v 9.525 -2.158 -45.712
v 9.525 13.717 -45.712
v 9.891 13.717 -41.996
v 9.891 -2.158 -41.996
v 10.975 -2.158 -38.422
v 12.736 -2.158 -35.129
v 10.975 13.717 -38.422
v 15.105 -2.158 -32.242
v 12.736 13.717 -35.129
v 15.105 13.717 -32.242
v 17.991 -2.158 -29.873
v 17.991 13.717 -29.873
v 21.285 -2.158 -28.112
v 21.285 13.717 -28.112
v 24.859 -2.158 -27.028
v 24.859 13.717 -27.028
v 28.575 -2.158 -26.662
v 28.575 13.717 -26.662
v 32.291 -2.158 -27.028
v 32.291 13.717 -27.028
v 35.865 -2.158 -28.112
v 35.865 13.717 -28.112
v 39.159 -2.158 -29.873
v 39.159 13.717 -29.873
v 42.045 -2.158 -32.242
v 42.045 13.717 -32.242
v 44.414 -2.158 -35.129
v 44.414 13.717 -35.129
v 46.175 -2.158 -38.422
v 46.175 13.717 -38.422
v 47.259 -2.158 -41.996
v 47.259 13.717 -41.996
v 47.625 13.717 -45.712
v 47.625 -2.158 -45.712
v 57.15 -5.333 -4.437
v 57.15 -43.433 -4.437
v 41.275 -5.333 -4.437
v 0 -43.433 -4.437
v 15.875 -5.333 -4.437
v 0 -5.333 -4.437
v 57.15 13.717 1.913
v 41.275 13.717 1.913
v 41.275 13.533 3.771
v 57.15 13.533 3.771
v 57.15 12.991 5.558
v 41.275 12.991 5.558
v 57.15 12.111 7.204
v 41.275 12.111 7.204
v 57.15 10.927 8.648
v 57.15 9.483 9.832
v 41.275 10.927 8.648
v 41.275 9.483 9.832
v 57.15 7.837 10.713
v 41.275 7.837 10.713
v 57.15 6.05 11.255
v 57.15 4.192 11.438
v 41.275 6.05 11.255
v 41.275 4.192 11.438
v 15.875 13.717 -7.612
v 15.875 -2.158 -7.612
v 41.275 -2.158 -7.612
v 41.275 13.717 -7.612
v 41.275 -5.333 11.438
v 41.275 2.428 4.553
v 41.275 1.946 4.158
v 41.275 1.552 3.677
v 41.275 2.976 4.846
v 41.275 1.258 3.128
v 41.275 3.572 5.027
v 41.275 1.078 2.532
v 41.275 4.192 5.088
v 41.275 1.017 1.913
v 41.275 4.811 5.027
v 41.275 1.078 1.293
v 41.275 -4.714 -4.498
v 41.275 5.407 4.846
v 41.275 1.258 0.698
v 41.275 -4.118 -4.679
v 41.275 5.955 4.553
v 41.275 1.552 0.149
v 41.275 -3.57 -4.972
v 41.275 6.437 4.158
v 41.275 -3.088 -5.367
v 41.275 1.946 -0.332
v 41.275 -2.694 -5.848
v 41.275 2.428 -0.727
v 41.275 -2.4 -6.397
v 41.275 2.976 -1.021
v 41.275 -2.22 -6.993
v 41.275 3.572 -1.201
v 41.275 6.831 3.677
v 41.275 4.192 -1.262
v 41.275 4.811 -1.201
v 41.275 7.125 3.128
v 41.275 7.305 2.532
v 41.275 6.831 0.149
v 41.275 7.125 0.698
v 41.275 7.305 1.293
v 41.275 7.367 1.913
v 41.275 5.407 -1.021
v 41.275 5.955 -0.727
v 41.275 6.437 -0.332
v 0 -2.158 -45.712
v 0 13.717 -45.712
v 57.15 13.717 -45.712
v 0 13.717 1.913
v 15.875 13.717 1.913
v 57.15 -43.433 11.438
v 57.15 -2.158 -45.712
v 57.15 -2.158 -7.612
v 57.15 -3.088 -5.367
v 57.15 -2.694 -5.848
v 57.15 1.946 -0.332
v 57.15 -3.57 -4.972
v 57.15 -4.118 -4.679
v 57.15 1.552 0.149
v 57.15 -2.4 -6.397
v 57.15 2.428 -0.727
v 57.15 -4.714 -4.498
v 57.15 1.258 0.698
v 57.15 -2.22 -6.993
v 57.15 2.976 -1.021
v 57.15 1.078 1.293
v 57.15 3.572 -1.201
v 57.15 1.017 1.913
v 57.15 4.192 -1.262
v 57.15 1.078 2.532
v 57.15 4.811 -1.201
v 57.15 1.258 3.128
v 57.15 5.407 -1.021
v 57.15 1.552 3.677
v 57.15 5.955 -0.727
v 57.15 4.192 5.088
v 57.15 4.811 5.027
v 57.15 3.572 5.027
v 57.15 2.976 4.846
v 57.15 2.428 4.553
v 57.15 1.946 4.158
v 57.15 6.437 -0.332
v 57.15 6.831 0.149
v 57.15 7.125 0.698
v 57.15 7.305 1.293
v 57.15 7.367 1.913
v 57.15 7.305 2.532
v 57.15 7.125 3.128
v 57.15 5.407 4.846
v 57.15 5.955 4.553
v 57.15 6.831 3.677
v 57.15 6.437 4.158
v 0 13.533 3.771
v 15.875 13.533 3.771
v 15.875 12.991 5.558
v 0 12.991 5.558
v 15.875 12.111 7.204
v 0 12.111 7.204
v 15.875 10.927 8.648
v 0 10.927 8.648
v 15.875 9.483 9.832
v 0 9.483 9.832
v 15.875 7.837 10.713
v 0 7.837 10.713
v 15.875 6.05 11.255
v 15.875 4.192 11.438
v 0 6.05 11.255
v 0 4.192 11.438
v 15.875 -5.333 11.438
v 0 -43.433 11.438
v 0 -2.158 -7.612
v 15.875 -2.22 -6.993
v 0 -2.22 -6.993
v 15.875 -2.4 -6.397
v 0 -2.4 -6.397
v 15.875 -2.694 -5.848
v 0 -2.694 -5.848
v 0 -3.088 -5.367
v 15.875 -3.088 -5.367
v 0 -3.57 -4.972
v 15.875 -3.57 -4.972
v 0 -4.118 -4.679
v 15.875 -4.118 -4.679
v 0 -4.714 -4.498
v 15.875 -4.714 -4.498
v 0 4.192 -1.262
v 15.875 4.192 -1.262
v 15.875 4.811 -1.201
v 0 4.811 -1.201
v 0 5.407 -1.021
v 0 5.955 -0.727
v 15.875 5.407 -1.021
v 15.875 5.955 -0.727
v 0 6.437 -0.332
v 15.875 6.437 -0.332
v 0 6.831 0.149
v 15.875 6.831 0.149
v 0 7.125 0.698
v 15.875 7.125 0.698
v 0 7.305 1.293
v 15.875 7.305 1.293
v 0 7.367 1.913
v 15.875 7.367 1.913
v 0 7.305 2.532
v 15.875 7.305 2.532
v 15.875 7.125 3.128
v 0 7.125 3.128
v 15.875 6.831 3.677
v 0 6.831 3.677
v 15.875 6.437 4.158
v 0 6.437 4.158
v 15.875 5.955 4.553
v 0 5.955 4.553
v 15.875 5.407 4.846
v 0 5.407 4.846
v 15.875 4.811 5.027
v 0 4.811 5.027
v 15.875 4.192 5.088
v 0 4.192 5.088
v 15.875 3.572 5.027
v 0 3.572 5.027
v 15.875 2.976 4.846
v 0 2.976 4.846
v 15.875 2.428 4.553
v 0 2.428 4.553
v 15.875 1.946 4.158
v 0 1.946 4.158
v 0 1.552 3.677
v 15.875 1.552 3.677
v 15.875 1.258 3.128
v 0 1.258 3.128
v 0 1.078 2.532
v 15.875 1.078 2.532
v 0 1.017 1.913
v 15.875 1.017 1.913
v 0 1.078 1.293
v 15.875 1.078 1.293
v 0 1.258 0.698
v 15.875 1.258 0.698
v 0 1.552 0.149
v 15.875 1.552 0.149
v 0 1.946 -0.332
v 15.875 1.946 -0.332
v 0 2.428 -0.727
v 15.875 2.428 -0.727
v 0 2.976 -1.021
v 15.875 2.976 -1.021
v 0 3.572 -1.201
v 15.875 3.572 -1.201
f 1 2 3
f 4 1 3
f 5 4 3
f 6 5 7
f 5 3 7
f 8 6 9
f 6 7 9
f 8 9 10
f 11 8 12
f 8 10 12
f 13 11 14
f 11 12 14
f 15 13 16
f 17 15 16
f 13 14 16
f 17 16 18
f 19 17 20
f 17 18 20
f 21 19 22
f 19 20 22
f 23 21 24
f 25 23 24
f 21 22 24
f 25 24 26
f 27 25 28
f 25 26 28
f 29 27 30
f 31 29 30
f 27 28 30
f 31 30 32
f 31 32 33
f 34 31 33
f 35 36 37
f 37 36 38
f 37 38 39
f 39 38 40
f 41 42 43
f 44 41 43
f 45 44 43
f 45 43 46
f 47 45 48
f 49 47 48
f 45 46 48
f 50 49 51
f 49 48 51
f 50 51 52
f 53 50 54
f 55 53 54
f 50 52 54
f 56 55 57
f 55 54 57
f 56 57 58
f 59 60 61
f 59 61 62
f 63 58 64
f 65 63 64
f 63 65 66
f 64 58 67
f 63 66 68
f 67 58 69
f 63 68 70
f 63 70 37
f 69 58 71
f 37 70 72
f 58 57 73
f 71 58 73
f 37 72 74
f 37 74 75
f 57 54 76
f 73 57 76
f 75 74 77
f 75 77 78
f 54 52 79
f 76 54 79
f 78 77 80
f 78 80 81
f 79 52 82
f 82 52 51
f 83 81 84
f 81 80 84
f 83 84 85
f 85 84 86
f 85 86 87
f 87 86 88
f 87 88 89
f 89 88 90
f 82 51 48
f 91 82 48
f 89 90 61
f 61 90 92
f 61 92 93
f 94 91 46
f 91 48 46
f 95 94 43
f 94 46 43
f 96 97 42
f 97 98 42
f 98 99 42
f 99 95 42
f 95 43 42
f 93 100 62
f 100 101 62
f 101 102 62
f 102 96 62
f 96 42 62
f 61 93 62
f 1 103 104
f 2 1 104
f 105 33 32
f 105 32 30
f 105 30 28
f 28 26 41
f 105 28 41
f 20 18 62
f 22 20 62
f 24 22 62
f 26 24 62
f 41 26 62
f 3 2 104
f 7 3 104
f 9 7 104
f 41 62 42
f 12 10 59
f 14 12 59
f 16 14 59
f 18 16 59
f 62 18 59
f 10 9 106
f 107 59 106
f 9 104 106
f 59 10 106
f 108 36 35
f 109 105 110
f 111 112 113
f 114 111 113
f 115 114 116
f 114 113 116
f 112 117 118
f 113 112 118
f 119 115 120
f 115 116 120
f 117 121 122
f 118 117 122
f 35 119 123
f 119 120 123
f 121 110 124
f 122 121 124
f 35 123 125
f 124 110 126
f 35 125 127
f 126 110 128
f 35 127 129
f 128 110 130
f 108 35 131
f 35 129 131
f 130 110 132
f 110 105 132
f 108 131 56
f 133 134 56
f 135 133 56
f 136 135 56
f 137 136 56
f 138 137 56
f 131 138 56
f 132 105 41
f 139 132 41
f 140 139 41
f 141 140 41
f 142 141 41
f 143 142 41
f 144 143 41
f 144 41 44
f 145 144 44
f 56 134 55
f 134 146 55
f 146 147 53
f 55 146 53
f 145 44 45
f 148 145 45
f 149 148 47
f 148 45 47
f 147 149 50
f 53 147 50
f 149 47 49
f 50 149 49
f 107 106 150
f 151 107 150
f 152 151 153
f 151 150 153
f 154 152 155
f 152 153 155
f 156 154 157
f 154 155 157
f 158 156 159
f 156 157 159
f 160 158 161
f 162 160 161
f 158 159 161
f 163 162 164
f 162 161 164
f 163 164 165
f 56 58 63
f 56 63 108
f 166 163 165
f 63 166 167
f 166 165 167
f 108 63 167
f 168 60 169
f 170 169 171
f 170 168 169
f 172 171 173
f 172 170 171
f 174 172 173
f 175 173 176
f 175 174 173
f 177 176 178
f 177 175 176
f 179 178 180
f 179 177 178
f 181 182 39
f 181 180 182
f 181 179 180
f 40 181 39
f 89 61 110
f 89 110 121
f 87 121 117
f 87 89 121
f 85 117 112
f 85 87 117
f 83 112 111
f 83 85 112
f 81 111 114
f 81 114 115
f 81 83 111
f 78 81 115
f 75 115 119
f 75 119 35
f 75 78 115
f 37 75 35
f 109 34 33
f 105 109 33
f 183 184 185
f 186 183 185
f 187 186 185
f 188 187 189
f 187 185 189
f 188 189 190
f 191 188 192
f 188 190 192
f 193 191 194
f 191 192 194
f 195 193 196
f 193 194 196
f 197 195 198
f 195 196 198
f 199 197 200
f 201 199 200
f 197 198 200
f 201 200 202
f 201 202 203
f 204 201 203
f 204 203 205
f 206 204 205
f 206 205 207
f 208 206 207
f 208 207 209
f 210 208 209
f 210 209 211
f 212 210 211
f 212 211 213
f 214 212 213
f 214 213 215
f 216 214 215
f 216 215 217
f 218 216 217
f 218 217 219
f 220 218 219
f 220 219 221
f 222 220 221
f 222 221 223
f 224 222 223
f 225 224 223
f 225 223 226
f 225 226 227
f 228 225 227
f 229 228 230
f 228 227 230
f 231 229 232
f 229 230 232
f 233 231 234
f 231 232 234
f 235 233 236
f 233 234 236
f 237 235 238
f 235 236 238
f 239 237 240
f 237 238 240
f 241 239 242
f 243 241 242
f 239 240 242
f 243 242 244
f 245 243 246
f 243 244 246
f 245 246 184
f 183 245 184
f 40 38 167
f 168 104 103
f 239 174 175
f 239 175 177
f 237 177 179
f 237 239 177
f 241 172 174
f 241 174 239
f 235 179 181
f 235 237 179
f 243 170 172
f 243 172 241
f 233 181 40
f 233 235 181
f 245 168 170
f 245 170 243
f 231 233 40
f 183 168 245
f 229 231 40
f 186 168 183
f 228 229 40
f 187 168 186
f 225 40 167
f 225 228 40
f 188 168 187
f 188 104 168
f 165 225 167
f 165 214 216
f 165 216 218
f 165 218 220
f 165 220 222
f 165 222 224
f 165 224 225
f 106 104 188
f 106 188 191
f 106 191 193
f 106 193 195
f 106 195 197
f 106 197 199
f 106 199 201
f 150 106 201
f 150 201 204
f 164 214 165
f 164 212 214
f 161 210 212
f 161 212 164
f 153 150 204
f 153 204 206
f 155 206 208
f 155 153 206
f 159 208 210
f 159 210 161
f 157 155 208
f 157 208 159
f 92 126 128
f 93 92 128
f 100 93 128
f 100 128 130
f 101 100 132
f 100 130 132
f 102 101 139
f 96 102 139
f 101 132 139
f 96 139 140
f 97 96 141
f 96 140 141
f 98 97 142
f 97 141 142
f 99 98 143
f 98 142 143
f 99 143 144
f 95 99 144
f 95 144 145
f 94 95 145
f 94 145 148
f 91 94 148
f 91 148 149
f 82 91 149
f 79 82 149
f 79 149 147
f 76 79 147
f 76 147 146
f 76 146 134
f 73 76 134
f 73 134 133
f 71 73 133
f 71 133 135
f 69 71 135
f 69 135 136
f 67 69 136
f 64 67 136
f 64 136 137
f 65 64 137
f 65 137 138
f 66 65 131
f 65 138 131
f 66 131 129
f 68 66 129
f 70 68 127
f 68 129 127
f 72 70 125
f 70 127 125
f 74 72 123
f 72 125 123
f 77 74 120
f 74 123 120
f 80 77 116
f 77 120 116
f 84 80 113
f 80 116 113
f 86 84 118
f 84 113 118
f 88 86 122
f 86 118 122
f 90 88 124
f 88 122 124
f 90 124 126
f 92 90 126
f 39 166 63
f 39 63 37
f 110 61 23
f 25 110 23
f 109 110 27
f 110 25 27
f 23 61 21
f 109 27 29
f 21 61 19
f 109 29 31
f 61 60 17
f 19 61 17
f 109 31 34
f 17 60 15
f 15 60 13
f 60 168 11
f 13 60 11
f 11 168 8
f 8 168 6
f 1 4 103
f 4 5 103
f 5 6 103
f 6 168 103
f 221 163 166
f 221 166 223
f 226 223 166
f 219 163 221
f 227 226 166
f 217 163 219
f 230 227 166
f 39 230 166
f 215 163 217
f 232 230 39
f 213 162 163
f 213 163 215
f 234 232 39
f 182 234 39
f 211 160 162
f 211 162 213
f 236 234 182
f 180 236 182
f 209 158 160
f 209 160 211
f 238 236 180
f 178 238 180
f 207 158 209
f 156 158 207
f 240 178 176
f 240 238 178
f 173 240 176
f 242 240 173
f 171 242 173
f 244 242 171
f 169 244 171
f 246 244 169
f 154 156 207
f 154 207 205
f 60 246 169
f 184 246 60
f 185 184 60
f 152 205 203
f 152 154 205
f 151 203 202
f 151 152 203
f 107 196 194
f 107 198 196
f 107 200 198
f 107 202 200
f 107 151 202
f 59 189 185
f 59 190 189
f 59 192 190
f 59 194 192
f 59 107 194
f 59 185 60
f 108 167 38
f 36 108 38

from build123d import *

# Parameters (mm, degrees)
BOSS_EXTRUDE1_DEPTH = 57.15
BOSS_EXTRUDE2_DEPTH = 57.15
CUT_EXTRUDE1_REACH  = 59.15
SKETCH4_R           = 19.05
SKETCH5_R           = 3.175
CUT_EXTRUDE2_DEPTH  = 25.4
SKETCH7_R           = 3.175
CUT_EXTRUDE3_DEPTH  = 58.15


with BuildPart() as part:
    # Sketch2 → Boss-Extrude1 (new body)
    with BuildSketch(Plane(origin=(0, 0, 0), x_dir=(0, 0, -1), z_dir=(1, 0, 0))):
        with BuildLine():
            Line((45.71235962, 13.716504708), (-1.91264038, 13.716504708))
            ThreePointArc((-1.91264038, 13.716504708), (-8.647832471, 10.926696799), (-11.43764038, 4.191504708))
            Line((-11.43764038, 4.191504708), (-11.43764038, -43.433495292))
            Line((-11.43764038, -43.433495292), (4.43735962, -43.433495292))
            Line((4.43735962, -43.433495292), (4.43735962, -2.158495292))
            Line((4.43735962, -2.158495292), (45.71235962, -2.158495292))
            Line((45.71235962, -2.158495292), (45.71235962, 13.716504708))
        make_face()
    extrude(amount=BOSS_EXTRUDE1_DEPTH)

    # Sketch3 → Boss-Extrude2 (add)
    with BuildSketch(Plane(origin=(0, 0, 0), x_dir=(0, 0, -1), z_dir=(1, 0, 0))):
        with BuildLine():
            Line((4.43735962, -5.333495292), (4.43735962, -2.158495292))
            Line((4.43735962, -2.158495292), (7.61235962, -2.158495292))
            ThreePointArc((7.61235962, -2.158495292), (5.36729559, -3.088431262), (4.43735962, -5.333495292))
        make_face()
    extrude(amount=BOSS_EXTRUDE2_DEPTH)

    # Sketch4 → Cut-Extrude1 (cut, up to next)
    with BuildSketch(Plane(origin=(0, 13.716504708, 0), x_dir=(1, 0, 0), z_dir=(0, 1, 0)), mode=Mode.PRIVATE) as cut_extrude1_sk1:
        with Locations((28.575, 45.71235962)):
            Circle(SKETCH4_R)
    cut_extrude1_tool1 = extrude(cut_extrude1_sk1.sketch, amount=-CUT_EXTRUDE1_REACH, mode=Mode.PRIVATE) & part.part
    add(cut_extrude1_tool1.solids().sort_by_distance((28.575, 13.716505, -45.71236))[0], mode=Mode.SUBTRACT)

    # Sketch5 → Cut-Extrude2 (cut)
    with BuildSketch(Plane(origin=(41.275, 0, 0), x_dir=(0, 0, -1), z_dir=(1, 0, 0))):
        with BuildLine():
            Line((7.61235962, -2.158495292), (7.61235962, 13.716504708))
            Line((7.61235962, 13.716504708), (-1.91264038, 13.716504708))
            ThreePointArc((-1.91264038, 13.716504708), (-8.647832471, 10.926696799), (-11.43764038, 4.191504708))
            Line((-11.43764038, 4.191504708), (-11.43764038, -2.158495292))
            Line((-11.43764038, -2.158495292), (-11.43764038, -5.333495292))
            Line((-11.43764038, -5.333495292), (4.43735962, -5.333495292))
            ThreePointArc((4.43735962, -5.333495292), (5.36729559, -3.088431262), (7.61235962, -2.158495292))
        make_face()
        with Locations((-1.91264038, 4.191504708)):
            Circle(SKETCH5_R, mode=Mode.SUBTRACT)
    extrude(amount=-CUT_EXTRUDE2_DEPTH, mode=Mode.SUBTRACT)

    # Sketch7 → Cut-Extrude3 (cut, through all)
    with BuildSketch(Plane(origin=(57.15, 0, 0), x_dir=(0, 0, -1), z_dir=(1, 0, 0))):
        with Locations((-1.91264038, 4.191504708)):
            Circle(SKETCH7_R)
    extrude(amount=-CUT_EXTRUDE3_DEPTH, mode=Mode.SUBTRACT)


solid = part.part
